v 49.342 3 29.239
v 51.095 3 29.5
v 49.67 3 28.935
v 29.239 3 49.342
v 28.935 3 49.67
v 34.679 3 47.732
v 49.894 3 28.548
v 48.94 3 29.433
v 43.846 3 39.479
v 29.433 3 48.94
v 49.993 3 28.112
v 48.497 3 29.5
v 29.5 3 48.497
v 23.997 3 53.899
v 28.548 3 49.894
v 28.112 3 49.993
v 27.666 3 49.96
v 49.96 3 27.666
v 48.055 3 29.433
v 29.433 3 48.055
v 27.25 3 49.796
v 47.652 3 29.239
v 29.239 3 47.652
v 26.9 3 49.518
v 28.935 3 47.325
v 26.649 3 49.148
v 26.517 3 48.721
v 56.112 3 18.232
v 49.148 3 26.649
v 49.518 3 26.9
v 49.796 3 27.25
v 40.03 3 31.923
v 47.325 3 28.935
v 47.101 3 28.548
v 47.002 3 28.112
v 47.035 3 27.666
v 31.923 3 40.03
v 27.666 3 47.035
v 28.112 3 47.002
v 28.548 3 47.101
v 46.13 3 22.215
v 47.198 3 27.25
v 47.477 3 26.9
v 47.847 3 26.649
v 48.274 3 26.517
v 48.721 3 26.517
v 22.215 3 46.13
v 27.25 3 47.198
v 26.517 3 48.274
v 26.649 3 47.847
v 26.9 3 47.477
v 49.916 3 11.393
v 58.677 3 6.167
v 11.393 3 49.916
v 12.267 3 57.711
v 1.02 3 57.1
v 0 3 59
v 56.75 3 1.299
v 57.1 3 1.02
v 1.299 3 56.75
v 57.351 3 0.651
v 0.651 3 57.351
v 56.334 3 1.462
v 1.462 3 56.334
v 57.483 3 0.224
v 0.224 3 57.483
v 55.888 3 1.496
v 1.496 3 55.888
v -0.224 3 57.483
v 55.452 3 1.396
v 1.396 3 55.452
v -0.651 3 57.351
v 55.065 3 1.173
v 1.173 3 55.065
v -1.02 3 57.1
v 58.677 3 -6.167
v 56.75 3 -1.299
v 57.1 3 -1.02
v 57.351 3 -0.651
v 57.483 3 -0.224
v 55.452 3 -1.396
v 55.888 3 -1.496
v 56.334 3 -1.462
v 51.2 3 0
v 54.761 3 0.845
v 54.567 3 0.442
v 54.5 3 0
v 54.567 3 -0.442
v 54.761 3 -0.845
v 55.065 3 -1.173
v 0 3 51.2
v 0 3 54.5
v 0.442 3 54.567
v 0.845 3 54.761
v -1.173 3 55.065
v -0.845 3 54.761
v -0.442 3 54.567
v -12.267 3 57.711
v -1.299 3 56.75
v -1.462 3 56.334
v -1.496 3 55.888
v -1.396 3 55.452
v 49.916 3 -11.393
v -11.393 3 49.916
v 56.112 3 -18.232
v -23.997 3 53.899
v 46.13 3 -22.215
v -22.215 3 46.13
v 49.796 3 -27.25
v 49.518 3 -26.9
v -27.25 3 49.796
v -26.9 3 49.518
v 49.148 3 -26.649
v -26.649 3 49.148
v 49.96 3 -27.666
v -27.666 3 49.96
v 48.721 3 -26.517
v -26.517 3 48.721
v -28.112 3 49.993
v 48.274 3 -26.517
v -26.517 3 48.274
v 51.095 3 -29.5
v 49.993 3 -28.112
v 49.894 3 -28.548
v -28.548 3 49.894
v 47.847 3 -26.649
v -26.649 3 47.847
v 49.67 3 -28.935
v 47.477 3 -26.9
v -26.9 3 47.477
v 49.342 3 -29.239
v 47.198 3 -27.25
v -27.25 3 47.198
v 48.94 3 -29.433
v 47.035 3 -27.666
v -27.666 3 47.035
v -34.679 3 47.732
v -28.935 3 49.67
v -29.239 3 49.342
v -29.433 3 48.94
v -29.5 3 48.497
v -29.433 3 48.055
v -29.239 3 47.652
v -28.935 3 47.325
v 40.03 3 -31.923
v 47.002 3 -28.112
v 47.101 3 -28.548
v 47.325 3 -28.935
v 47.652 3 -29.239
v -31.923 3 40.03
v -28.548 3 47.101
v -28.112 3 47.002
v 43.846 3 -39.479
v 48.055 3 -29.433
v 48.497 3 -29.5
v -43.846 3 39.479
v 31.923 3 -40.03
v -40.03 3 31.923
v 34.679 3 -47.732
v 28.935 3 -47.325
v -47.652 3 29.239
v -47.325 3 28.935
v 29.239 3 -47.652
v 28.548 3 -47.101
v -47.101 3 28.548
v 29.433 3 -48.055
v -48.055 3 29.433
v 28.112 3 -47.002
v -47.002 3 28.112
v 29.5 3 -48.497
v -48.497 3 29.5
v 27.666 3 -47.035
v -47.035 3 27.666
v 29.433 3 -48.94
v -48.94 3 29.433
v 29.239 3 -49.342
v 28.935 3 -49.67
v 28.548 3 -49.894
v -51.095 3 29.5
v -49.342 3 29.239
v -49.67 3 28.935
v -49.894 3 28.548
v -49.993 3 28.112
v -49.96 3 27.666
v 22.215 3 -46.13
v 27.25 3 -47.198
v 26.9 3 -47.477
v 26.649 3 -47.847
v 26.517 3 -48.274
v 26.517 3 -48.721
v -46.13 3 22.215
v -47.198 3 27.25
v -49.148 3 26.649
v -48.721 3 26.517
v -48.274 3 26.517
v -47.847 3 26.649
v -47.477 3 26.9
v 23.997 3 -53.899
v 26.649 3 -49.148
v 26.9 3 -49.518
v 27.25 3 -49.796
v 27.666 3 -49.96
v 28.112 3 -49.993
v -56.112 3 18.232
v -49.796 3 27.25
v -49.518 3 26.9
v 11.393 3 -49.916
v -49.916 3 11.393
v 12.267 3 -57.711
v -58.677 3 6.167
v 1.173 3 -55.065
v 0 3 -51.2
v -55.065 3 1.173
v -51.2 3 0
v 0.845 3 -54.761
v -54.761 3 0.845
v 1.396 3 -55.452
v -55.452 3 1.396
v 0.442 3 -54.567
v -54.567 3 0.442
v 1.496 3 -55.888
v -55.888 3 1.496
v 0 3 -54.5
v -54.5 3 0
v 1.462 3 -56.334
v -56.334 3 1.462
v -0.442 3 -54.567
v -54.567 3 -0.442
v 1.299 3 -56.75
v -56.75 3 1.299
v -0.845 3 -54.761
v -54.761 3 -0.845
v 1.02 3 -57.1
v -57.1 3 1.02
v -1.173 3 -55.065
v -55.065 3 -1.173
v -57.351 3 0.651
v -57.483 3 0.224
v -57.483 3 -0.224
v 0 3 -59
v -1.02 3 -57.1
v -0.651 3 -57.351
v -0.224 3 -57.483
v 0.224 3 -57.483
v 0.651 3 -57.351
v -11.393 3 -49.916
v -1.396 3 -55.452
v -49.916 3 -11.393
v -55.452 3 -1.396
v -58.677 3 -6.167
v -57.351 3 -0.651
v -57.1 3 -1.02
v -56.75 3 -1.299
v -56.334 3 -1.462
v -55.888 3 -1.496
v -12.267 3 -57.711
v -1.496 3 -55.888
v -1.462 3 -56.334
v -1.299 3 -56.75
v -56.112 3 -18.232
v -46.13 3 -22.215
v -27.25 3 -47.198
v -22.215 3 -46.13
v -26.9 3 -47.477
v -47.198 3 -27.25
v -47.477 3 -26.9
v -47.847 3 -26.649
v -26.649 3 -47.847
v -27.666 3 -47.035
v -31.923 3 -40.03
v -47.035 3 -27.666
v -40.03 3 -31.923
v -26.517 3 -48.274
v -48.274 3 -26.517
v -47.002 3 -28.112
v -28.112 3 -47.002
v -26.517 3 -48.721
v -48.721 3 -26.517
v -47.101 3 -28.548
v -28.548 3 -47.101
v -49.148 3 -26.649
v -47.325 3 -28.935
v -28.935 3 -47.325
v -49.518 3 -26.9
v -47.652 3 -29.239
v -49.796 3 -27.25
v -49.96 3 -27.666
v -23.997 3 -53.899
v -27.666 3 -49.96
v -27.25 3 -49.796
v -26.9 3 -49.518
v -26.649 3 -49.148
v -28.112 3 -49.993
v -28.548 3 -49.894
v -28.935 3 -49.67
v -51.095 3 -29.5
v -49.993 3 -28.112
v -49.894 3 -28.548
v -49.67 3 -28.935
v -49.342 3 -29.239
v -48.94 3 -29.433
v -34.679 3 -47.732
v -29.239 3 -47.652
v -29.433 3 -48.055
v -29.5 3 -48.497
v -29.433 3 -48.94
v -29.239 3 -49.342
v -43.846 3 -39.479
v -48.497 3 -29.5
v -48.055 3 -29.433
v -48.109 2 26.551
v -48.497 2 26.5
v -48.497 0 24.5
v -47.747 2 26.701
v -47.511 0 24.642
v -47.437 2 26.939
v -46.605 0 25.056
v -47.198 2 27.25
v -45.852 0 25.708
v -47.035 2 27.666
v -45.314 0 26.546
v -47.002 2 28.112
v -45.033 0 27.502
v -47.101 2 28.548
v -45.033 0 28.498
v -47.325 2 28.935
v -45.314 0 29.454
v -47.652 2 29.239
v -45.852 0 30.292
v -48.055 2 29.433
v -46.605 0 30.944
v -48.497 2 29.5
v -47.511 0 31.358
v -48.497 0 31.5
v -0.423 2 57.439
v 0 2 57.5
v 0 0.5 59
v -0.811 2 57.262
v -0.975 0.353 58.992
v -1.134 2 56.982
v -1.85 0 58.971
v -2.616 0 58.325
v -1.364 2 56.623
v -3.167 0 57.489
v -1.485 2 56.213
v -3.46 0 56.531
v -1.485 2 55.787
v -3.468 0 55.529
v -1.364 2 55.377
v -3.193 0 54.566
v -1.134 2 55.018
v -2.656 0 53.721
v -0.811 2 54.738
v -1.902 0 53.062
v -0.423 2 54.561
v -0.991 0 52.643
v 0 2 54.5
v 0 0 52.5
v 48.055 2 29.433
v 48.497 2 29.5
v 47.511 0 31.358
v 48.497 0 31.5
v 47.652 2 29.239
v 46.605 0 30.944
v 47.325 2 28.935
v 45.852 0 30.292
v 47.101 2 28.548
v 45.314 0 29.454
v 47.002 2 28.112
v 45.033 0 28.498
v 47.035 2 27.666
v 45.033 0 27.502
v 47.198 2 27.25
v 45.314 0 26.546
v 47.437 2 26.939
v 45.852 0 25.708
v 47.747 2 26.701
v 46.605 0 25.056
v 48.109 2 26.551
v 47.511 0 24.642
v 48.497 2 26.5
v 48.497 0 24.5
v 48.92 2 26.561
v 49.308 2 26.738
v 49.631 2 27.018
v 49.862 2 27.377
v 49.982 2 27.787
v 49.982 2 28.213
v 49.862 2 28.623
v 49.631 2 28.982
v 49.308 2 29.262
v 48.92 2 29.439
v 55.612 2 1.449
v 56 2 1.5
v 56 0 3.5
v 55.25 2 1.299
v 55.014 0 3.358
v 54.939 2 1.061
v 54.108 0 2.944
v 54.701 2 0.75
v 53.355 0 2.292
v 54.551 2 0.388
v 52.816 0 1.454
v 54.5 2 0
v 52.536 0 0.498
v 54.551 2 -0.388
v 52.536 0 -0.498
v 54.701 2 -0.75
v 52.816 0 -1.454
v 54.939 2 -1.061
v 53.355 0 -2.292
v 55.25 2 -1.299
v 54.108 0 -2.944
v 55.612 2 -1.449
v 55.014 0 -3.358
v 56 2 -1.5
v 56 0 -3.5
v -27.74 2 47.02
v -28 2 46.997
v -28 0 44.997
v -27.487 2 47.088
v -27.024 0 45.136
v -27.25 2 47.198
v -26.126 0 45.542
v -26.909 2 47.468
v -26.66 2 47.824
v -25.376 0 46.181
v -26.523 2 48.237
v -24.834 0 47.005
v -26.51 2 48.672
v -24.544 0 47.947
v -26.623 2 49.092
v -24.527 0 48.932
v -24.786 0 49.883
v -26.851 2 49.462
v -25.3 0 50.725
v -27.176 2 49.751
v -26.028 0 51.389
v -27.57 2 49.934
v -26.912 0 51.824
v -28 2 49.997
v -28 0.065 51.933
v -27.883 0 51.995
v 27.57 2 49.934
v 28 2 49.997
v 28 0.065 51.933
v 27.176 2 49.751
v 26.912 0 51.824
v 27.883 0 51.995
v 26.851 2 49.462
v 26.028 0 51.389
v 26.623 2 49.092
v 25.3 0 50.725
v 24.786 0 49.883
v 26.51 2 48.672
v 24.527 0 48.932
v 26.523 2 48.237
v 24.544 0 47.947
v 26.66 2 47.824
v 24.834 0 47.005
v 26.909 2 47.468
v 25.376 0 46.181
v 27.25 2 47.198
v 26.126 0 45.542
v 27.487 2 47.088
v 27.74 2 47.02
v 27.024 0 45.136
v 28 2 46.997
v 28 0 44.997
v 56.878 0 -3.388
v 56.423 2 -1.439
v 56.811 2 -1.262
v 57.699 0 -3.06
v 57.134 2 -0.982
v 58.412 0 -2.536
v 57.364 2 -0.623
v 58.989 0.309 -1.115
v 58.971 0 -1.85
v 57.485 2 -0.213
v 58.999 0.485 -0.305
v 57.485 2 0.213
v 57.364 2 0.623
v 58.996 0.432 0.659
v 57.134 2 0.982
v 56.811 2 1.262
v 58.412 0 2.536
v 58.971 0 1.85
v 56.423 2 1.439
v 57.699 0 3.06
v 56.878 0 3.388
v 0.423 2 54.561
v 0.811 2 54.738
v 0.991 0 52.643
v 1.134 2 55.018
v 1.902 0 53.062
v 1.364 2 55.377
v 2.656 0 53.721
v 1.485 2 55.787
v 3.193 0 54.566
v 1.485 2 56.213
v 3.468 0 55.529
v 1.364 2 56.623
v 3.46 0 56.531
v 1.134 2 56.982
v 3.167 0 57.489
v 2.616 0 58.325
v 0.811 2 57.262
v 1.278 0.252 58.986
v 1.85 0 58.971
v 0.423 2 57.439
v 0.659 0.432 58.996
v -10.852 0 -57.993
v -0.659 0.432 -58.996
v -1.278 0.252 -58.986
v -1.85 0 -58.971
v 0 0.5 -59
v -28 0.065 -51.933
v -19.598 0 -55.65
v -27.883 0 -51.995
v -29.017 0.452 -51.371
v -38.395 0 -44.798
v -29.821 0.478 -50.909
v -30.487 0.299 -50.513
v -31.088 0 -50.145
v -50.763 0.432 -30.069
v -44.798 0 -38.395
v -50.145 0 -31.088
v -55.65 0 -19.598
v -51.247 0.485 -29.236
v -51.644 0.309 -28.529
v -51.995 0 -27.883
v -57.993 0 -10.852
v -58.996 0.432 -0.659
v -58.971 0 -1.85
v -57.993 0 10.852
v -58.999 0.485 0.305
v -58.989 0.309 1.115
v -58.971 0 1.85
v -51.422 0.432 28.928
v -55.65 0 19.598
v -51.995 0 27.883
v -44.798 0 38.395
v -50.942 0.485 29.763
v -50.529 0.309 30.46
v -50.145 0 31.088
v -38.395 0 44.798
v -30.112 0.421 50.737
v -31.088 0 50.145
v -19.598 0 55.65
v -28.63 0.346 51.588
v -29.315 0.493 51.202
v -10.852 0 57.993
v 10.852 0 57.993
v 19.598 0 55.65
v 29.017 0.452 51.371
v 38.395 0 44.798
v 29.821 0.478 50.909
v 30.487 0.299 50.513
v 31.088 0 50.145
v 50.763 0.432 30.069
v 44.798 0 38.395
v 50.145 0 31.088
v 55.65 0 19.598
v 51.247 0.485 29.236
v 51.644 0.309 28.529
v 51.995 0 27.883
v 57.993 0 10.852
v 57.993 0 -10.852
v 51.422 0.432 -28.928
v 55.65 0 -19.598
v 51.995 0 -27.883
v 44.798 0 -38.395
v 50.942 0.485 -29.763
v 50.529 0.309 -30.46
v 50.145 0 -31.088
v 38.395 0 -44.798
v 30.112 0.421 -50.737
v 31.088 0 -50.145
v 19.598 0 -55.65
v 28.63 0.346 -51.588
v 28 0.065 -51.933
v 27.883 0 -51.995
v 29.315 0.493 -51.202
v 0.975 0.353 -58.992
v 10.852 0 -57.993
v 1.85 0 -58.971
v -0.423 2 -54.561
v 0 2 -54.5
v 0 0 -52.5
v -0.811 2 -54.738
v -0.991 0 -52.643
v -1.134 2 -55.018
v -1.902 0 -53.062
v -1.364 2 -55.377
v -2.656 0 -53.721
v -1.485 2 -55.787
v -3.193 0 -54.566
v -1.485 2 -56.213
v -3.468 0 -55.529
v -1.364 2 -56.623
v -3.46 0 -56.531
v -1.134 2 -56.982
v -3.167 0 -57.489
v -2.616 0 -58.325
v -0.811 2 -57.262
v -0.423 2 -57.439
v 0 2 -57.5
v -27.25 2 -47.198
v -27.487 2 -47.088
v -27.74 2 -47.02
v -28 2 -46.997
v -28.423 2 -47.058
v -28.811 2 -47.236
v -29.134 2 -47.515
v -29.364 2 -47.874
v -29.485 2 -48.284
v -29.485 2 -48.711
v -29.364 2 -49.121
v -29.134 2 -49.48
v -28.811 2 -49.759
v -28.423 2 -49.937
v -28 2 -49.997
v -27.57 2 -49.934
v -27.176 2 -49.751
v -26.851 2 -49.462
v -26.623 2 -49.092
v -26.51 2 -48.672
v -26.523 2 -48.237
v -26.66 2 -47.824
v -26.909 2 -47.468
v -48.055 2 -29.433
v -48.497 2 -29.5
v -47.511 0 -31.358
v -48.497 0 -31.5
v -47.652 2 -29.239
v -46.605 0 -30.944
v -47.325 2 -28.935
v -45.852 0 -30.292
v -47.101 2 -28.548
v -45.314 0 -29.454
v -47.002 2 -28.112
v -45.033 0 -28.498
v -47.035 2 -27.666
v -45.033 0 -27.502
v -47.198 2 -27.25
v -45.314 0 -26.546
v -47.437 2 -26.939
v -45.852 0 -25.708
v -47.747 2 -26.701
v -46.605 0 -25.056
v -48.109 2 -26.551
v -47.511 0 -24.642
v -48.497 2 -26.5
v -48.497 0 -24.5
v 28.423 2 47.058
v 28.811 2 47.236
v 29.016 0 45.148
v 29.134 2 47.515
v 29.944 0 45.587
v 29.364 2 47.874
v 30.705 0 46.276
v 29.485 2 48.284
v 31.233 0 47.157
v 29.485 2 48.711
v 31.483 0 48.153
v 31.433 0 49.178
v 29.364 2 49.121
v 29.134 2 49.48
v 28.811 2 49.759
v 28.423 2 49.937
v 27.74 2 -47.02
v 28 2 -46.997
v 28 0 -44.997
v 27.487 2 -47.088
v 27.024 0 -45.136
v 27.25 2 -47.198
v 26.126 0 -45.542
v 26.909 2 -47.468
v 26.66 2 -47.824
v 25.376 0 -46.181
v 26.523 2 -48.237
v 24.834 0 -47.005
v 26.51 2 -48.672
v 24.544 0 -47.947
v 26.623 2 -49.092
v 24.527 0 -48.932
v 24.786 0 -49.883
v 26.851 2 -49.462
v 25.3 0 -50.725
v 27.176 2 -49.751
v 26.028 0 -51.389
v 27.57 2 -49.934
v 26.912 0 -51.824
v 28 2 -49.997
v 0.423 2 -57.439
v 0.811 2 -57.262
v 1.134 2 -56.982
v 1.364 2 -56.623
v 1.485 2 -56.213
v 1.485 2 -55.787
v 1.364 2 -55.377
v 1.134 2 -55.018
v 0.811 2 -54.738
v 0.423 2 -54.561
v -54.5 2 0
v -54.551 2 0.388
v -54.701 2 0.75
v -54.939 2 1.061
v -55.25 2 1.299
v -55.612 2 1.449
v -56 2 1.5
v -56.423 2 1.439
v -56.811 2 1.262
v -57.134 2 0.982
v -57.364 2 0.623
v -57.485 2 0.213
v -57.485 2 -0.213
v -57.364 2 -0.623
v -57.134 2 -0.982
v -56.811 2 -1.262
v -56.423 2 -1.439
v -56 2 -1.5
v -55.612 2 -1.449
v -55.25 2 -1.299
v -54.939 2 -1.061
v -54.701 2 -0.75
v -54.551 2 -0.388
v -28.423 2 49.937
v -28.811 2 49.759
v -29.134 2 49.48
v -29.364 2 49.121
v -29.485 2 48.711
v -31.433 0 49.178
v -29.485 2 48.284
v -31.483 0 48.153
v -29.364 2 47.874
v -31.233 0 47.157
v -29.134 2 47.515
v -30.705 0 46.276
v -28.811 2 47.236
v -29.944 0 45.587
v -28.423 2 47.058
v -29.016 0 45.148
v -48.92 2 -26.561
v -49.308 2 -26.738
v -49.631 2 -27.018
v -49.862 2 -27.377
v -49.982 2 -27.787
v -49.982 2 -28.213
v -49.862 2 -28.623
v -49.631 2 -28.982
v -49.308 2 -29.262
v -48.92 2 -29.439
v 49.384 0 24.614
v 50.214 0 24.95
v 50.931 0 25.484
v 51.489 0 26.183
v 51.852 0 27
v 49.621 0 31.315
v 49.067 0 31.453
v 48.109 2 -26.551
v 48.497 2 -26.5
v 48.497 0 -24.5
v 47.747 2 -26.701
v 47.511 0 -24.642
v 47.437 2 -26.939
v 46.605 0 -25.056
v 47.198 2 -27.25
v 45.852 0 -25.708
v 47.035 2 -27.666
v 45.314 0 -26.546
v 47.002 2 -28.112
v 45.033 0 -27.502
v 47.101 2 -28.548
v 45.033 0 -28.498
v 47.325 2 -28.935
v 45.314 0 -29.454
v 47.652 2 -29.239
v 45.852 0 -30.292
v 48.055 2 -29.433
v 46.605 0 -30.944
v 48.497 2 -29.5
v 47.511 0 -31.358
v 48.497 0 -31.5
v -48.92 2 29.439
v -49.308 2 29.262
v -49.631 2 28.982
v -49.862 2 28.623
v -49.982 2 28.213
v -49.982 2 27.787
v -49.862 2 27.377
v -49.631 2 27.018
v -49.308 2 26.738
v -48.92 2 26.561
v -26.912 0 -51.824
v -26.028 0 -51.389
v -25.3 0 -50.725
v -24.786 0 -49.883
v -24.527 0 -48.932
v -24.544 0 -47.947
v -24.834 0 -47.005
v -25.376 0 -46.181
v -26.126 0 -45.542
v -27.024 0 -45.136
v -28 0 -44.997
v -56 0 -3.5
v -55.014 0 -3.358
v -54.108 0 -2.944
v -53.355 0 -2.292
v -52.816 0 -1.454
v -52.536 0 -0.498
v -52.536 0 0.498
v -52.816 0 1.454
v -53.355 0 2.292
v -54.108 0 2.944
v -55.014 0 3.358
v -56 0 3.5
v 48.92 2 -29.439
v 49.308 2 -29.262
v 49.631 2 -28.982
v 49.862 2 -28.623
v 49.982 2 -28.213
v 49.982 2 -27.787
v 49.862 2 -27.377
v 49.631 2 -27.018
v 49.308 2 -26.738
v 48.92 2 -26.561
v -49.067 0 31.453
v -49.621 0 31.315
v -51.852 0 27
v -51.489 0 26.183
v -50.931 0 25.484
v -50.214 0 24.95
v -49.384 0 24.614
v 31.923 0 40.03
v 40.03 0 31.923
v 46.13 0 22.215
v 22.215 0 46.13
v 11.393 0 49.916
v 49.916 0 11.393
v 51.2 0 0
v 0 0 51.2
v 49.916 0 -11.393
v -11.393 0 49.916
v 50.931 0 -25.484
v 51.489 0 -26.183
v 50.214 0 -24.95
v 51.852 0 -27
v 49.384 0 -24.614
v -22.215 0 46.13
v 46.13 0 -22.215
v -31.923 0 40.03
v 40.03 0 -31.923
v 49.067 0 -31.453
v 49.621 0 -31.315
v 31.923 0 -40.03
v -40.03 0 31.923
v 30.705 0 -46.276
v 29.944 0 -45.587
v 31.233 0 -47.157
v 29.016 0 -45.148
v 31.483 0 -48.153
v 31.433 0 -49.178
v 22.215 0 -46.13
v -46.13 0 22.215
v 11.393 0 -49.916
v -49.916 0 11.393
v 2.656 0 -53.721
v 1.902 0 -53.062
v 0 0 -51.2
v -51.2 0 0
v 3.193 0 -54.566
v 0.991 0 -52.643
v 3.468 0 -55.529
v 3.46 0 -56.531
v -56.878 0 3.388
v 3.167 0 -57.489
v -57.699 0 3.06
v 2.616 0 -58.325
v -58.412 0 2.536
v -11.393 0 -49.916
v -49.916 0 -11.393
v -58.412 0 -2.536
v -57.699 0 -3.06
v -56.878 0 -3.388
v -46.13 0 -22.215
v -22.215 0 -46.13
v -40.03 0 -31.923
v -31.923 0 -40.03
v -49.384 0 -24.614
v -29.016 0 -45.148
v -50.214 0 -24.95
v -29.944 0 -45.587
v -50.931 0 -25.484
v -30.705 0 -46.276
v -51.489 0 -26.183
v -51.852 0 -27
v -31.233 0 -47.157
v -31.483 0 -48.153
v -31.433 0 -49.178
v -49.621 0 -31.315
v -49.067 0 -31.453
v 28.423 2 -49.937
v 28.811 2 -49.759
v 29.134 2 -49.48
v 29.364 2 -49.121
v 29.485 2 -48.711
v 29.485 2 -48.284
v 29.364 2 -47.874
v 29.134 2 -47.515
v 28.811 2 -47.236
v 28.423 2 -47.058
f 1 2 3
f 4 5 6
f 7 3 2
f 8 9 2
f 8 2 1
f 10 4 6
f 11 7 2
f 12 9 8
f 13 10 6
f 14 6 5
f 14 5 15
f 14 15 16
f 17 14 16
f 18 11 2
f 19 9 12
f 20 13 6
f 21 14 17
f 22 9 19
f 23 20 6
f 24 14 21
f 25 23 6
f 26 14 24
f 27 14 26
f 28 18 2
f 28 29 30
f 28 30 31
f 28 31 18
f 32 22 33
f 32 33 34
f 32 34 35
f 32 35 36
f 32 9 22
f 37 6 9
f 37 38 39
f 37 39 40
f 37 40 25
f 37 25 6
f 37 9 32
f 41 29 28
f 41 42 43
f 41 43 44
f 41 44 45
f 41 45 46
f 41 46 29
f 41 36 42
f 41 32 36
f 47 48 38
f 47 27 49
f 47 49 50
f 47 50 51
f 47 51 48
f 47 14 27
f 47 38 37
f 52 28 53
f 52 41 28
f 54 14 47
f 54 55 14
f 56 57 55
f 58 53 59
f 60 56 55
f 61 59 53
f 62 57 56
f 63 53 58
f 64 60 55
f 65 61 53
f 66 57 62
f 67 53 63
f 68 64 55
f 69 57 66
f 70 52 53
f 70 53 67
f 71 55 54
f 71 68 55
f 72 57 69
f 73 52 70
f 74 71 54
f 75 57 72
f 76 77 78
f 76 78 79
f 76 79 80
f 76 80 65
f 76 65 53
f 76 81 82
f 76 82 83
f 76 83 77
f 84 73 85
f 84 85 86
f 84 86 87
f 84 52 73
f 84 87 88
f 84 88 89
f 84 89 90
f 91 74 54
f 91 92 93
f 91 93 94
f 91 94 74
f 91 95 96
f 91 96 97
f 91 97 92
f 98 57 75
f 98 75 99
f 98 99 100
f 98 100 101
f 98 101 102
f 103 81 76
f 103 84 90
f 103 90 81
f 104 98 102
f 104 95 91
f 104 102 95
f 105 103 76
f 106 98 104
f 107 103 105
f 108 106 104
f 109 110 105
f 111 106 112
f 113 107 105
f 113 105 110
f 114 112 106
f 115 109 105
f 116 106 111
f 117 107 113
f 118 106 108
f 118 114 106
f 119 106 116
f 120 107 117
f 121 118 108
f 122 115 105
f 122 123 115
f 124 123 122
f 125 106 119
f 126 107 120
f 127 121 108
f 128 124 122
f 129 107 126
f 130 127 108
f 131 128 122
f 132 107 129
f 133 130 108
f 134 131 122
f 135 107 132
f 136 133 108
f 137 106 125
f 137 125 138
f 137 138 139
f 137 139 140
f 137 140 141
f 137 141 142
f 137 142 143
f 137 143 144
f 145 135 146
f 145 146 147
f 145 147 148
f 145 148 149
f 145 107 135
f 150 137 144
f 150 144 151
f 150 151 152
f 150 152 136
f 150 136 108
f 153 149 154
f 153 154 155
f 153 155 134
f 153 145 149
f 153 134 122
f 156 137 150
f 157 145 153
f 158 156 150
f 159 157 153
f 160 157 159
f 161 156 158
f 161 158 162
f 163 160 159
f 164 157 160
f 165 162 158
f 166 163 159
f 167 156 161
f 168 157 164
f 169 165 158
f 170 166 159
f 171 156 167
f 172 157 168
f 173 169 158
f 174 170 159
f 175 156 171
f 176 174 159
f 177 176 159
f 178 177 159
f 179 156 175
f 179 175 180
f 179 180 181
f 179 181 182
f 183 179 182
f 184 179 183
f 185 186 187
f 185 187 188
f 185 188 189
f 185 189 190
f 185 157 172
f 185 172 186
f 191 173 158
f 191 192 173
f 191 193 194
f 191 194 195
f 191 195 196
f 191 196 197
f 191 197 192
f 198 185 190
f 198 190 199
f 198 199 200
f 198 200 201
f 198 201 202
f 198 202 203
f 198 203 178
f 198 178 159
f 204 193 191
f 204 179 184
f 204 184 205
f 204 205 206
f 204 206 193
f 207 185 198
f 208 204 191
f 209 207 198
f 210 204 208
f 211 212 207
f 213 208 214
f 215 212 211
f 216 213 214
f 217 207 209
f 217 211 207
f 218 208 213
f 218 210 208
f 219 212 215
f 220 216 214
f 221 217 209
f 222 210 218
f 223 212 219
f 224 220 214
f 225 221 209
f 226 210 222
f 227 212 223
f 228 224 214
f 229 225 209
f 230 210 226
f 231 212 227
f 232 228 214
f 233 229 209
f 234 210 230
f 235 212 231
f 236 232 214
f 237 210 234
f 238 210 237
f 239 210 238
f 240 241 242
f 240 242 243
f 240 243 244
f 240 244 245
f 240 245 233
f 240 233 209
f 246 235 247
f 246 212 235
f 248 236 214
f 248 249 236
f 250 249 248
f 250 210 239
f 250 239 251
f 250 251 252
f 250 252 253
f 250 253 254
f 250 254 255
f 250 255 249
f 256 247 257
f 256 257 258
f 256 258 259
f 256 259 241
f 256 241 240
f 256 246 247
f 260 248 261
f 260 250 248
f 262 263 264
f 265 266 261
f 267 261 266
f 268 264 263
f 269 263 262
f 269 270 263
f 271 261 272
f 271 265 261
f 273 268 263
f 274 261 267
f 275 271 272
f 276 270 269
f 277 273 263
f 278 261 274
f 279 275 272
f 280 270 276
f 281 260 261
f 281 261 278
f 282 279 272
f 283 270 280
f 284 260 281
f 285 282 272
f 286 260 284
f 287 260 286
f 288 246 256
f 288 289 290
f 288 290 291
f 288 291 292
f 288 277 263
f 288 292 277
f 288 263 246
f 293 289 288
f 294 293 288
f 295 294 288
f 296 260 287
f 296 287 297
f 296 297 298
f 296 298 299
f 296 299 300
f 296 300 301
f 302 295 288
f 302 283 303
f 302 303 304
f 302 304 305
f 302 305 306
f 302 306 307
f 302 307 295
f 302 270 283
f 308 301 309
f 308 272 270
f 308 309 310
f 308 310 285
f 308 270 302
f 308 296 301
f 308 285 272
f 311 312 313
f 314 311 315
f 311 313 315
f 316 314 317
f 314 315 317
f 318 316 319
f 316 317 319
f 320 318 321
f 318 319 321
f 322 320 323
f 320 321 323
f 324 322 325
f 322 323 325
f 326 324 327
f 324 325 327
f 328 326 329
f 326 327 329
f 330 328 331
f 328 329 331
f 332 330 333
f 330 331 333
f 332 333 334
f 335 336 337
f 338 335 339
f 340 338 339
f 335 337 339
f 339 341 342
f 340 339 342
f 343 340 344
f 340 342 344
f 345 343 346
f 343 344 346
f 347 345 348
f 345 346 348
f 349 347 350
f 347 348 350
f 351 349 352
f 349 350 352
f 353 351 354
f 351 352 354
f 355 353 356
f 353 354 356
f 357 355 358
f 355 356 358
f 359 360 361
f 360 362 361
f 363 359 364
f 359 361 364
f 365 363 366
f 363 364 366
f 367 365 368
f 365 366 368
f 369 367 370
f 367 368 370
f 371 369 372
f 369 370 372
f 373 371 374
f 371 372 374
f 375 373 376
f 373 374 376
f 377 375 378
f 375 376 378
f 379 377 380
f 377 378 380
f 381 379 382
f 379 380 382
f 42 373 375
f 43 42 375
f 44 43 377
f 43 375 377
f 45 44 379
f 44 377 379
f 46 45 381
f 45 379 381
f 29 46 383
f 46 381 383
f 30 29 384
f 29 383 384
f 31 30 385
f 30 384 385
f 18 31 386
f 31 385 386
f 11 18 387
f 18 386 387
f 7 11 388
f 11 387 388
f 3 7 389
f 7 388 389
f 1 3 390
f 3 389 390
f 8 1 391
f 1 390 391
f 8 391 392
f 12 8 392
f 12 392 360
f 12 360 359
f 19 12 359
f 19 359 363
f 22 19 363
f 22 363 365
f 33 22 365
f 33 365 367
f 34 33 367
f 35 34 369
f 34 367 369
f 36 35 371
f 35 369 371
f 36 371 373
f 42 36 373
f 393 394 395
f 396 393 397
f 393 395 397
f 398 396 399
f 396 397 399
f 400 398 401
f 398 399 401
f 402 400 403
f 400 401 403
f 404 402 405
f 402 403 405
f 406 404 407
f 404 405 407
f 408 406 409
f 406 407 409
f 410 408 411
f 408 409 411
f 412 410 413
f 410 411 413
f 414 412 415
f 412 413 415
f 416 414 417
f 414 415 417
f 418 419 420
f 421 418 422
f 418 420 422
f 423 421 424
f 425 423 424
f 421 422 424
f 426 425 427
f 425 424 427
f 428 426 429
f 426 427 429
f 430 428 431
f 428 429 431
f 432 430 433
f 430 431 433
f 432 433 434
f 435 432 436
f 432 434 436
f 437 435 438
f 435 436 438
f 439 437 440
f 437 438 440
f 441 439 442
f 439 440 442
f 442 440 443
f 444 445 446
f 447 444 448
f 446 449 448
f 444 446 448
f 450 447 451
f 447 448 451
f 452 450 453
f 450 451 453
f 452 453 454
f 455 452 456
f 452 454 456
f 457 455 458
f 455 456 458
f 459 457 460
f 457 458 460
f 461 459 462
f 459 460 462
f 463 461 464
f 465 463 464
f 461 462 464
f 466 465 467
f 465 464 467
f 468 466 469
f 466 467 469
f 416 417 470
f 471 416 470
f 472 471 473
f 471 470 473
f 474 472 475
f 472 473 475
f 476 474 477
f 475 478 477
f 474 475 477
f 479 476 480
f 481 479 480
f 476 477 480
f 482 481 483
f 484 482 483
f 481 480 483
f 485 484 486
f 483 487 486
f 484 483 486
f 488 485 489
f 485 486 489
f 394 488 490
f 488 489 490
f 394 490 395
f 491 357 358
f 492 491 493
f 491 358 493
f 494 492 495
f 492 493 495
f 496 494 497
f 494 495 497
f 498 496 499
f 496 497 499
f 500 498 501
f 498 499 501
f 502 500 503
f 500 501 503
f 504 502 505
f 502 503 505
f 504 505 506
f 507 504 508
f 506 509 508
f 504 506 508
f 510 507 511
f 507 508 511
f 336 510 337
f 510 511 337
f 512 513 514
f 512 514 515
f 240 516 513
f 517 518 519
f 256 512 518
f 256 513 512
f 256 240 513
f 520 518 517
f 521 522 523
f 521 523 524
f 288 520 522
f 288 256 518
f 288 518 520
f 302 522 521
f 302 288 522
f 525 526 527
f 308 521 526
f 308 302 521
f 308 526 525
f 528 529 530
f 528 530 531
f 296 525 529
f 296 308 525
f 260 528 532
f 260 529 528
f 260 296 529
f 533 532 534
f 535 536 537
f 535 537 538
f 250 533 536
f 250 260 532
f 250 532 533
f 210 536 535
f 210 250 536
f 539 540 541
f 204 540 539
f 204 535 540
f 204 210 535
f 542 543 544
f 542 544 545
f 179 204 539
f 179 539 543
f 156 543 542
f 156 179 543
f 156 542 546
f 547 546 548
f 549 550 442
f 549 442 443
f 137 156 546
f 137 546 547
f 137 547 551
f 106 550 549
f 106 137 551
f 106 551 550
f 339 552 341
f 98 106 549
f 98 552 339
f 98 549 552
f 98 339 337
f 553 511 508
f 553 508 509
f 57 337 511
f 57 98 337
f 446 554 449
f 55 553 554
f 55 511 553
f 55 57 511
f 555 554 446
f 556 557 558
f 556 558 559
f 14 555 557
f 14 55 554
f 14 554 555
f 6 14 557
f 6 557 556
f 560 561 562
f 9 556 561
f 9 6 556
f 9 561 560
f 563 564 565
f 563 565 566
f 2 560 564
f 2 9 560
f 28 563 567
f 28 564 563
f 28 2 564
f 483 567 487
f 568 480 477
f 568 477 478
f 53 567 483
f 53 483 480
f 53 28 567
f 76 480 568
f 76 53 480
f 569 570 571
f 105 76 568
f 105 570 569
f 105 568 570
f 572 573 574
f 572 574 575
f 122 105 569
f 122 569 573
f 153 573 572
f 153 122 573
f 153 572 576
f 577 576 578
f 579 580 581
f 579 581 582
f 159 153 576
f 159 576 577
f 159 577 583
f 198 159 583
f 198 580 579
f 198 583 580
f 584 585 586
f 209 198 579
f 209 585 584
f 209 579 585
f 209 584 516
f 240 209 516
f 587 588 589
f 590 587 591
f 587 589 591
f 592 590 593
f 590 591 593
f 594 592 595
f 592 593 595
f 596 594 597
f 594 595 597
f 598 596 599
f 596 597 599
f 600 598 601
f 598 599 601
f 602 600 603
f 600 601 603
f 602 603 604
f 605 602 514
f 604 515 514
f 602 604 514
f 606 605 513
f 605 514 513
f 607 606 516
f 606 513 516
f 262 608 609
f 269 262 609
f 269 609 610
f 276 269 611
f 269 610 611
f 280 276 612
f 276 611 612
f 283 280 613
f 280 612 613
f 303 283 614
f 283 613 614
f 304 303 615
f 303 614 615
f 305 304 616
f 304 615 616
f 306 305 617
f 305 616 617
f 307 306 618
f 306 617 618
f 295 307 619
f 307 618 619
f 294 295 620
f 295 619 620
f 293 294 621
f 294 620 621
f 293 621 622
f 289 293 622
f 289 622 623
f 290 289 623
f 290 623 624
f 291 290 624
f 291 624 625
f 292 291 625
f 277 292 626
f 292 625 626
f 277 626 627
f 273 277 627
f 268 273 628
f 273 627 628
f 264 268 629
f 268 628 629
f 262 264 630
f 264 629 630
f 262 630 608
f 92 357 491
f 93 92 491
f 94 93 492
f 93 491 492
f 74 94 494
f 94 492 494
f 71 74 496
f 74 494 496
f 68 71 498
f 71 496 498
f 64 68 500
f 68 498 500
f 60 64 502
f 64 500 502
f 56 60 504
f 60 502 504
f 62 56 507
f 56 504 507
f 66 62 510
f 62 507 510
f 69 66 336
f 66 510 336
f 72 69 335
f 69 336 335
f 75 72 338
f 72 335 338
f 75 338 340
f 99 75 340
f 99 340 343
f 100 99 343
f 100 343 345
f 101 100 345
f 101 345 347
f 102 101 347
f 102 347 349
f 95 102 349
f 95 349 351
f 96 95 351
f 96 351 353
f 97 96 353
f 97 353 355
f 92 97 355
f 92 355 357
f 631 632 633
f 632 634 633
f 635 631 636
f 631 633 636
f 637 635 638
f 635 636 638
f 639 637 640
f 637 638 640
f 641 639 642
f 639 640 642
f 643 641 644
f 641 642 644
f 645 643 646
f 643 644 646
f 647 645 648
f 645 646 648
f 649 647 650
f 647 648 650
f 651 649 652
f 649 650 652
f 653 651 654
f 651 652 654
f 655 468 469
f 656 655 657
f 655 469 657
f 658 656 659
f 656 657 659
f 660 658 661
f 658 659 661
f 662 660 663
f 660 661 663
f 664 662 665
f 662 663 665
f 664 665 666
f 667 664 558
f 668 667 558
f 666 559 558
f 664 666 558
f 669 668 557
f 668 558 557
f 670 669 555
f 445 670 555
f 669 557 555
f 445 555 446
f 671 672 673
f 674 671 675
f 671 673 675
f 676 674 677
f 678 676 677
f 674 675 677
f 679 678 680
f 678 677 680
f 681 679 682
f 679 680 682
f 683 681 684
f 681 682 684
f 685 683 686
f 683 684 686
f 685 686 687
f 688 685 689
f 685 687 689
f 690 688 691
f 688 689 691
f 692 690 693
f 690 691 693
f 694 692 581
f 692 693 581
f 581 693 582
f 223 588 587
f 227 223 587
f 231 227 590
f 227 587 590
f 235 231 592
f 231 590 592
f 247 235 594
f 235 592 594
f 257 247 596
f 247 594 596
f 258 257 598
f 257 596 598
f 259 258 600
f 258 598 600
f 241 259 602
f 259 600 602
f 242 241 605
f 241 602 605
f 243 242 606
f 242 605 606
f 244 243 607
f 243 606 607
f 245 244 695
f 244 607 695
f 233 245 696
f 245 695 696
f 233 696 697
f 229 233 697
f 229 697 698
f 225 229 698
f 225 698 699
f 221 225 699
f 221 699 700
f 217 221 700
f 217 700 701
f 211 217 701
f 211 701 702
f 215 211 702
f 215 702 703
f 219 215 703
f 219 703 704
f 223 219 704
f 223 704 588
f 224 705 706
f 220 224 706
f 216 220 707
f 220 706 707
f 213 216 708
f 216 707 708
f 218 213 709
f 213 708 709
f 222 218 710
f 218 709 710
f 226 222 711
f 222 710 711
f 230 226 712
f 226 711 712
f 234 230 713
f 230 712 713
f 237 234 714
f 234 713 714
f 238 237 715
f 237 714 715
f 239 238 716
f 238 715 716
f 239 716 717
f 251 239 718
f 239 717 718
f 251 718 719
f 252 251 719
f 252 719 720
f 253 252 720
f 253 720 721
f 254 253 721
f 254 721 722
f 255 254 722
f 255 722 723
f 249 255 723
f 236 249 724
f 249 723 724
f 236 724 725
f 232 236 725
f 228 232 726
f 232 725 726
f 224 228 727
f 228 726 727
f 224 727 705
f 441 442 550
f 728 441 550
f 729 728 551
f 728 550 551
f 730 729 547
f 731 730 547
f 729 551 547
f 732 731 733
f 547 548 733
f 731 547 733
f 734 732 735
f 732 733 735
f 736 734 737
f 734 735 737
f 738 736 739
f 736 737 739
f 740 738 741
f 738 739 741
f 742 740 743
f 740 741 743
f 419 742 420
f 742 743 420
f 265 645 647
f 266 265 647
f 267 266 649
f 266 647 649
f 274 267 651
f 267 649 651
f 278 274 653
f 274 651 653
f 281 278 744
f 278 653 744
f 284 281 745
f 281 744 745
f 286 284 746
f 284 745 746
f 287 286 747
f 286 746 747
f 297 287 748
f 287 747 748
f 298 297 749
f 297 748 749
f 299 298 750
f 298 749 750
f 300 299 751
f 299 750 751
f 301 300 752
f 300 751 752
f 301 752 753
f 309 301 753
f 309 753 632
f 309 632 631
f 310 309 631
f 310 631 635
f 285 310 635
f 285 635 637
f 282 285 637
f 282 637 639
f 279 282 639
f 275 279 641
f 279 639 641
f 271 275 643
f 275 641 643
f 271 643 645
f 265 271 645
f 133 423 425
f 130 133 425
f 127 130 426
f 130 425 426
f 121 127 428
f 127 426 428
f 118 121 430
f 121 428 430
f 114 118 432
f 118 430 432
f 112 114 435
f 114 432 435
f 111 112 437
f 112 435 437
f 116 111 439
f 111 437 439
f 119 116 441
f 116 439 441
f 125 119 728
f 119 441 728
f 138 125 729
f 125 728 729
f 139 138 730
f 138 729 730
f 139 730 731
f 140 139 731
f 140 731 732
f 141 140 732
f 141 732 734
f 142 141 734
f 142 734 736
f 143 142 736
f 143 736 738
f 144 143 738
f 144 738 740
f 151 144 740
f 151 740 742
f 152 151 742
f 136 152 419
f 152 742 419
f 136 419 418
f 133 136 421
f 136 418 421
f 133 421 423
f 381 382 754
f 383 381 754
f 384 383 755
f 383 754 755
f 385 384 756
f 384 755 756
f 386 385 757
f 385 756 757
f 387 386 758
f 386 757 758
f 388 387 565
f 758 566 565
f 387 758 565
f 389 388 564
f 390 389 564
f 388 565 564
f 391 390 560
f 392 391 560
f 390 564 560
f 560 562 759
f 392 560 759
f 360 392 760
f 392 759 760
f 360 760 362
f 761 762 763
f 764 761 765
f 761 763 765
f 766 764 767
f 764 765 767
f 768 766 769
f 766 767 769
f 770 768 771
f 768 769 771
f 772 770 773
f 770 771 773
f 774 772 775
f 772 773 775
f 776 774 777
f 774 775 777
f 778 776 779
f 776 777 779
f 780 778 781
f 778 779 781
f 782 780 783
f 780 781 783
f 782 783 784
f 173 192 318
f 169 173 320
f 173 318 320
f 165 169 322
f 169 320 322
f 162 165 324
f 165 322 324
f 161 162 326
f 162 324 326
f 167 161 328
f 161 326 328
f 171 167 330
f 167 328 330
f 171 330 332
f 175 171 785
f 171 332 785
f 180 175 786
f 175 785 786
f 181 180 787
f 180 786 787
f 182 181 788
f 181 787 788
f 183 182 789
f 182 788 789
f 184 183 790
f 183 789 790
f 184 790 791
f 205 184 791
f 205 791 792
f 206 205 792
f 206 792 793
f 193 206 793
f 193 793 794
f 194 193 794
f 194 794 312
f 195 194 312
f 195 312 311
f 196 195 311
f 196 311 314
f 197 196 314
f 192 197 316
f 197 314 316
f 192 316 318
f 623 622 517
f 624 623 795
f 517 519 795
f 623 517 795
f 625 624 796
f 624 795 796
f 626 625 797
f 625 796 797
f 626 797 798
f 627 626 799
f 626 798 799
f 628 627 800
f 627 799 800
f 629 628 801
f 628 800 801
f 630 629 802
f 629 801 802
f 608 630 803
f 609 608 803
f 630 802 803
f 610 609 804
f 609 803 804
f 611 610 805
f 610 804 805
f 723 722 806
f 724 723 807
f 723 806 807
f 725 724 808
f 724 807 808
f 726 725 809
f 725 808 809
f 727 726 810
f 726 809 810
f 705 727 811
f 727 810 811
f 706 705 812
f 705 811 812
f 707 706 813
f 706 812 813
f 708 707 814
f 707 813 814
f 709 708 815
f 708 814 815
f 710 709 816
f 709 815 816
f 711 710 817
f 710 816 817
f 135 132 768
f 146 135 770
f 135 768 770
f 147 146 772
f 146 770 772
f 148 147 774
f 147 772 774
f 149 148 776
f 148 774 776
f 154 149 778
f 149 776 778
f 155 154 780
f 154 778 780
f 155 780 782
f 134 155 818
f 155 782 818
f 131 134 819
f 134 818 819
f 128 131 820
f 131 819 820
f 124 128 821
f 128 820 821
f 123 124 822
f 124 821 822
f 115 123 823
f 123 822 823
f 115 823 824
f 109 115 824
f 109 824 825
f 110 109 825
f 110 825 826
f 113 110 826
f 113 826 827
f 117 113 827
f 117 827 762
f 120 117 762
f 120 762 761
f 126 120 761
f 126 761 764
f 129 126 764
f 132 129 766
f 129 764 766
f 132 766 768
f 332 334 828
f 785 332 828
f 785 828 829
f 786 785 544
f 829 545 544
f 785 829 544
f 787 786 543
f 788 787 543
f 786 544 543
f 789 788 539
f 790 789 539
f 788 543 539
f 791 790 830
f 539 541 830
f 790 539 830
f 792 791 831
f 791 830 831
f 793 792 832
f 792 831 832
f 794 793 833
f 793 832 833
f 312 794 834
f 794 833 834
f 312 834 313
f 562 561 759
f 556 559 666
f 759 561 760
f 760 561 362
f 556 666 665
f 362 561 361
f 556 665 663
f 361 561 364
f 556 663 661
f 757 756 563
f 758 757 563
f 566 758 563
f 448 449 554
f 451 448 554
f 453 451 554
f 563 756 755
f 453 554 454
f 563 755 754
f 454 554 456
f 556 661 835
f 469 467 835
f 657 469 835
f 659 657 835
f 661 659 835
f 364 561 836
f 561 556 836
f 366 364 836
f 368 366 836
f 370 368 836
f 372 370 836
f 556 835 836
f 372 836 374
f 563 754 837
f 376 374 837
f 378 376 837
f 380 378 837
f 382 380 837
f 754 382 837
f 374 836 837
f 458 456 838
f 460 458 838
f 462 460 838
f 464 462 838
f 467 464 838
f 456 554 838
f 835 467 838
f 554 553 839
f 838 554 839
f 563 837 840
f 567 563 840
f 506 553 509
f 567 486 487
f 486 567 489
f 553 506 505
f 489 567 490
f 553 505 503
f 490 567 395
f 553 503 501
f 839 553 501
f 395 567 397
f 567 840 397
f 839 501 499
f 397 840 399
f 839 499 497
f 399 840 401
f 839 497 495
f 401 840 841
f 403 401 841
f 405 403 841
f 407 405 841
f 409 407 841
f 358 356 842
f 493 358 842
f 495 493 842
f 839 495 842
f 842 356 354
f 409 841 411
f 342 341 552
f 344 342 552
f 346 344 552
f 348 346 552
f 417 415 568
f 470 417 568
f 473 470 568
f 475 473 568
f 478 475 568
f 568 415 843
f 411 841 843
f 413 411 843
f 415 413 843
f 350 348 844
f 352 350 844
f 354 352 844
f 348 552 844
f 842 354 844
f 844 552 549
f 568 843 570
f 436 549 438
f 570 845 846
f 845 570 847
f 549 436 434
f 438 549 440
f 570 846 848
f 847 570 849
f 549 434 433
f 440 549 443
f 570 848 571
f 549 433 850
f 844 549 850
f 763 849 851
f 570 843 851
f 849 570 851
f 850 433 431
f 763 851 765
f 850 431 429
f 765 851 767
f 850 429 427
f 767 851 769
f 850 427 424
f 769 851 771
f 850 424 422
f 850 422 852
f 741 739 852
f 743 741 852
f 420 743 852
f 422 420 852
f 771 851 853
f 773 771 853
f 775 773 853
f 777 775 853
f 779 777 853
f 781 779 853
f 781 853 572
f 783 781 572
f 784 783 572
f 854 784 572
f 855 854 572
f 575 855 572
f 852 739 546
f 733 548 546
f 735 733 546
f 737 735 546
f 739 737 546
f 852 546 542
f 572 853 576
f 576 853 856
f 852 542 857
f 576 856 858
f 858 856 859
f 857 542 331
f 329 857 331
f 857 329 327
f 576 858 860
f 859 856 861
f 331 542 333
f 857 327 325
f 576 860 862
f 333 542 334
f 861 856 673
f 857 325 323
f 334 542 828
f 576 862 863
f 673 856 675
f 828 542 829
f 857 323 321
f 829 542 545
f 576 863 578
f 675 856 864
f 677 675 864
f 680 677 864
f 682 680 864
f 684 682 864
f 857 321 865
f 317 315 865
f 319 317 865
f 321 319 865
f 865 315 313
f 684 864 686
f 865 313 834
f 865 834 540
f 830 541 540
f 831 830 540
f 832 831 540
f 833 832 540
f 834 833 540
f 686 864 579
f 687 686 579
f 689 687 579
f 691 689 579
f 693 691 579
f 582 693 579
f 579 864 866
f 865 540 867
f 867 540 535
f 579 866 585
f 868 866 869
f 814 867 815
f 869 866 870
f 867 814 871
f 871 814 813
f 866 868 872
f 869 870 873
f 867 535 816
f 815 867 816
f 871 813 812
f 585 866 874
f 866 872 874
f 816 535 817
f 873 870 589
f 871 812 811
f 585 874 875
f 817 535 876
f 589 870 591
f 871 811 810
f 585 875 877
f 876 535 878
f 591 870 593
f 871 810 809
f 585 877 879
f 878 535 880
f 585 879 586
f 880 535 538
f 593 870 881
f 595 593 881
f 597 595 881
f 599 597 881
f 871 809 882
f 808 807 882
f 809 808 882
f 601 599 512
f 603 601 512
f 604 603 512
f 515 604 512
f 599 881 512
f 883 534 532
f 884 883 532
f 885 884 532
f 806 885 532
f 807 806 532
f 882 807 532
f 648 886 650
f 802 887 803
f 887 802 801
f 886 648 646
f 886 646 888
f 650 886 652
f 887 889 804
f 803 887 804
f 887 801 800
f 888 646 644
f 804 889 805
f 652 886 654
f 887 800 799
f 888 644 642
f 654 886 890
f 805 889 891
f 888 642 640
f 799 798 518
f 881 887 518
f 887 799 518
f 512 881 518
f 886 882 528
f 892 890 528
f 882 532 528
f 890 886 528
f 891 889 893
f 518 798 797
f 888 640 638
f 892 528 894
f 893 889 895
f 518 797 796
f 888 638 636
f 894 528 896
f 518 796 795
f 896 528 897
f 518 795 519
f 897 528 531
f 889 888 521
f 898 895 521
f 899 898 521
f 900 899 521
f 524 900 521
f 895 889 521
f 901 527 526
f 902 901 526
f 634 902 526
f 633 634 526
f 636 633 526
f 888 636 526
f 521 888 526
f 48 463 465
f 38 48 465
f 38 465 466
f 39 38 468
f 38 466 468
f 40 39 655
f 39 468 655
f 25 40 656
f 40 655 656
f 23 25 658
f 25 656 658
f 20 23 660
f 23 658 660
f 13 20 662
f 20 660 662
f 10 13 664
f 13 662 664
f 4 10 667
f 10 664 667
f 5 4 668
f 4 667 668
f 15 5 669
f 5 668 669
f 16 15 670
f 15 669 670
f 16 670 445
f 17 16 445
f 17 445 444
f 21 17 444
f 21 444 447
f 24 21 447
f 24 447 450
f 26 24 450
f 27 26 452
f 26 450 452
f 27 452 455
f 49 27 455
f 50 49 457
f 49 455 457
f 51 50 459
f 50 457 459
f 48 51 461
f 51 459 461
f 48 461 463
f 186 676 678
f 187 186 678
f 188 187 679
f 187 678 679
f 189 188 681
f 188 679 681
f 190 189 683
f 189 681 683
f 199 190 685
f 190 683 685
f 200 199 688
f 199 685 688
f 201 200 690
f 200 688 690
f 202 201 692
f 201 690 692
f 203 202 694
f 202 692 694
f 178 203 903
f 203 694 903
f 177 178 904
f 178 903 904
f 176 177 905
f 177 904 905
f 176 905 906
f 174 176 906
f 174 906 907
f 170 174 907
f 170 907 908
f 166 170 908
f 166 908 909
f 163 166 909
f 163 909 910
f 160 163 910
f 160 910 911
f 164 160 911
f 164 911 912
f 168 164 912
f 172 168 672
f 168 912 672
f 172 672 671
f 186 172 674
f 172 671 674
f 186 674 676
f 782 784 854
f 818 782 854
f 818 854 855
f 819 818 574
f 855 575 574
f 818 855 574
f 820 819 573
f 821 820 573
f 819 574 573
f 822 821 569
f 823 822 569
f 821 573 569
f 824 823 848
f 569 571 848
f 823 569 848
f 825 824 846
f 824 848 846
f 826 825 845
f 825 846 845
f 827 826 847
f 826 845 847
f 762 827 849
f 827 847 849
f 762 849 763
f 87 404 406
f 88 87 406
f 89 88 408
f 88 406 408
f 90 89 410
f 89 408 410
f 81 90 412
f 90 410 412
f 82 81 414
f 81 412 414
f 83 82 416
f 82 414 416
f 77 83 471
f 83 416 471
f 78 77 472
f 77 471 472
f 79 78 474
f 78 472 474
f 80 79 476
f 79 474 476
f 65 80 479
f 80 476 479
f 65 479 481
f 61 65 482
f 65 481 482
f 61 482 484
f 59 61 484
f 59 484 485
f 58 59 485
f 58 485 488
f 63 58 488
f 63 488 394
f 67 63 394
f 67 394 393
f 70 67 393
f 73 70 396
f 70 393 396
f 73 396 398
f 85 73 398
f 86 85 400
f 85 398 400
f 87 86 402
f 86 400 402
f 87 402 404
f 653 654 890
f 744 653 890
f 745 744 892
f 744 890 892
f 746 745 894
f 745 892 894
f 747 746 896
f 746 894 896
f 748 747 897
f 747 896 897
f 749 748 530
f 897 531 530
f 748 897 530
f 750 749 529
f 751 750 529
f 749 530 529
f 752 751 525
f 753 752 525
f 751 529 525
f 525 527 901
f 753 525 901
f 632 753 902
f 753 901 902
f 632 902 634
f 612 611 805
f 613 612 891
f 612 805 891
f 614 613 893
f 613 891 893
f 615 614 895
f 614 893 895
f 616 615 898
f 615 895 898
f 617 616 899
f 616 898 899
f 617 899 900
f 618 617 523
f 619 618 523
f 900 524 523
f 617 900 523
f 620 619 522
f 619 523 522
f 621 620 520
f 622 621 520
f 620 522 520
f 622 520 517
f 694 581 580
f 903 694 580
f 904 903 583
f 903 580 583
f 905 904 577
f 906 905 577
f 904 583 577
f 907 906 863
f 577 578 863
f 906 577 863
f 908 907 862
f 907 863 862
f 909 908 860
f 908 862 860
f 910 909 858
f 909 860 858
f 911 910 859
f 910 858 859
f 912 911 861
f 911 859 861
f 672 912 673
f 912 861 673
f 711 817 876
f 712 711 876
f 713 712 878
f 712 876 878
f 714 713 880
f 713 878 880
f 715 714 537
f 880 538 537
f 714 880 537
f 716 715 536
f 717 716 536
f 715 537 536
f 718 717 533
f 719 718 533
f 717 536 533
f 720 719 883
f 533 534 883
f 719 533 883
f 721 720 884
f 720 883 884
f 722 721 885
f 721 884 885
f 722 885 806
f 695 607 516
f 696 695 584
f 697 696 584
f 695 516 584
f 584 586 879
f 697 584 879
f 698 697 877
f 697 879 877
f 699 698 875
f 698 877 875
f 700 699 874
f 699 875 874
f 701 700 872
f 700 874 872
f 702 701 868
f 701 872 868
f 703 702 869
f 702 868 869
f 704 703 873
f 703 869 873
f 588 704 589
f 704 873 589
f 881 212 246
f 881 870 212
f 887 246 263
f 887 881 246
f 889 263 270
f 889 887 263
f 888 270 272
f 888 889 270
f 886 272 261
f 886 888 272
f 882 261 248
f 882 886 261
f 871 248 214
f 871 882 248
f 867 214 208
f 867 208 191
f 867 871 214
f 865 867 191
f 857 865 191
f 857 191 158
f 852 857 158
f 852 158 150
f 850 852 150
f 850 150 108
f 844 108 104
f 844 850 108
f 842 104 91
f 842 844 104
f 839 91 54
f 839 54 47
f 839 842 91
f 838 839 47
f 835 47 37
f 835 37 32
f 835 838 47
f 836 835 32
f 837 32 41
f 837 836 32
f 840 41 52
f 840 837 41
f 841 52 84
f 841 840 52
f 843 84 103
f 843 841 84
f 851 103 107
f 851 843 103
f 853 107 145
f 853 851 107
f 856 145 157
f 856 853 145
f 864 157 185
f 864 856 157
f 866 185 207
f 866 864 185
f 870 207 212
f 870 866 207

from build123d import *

# Parameters (mm, degrees)
SKETCH_2_R               = 1.5
CUT_EXTRUDE_1_DEPTH      = 10
PATTERN_CIRCULAR_1_COUNT = 12


with BuildPart() as part:
    # 草图1 → 旋转1 (revolve)
    with BuildSketch(Plane.XY, mode=Mode.PRIVATE) as revolve_1_sk:
        Polygon((-53, 0), (-59, 0), (-59, 3), (-51.2, 3), (-51.2, 0), align=None)
    revolve(revolve_1_sk.sketch.rotate(Axis((0, 0, 0), (0, 1, 0)), 270), axis=Axis((0, 0, 0), (0, 1, 0)))

    # 草图2 → 切除-拉伸1 (cut)
    with BuildSketch(Plane.XZ):
        with Locations(Location((0, 56, 0), (0, 0, 270))):
            Circle(SKETCH_2_R)
    cut_extrude_1 = extrude(amount=-CUT_EXTRUDE_1_DEPTH, mode=Mode.SUBTRACT)

    # 阵列(圆周)1: 切除-拉伸1 ×12 about axis
    pattern_circular_1_axis = Axis((0, 0, 0), (0, 1, 0))
    for i in range(1, PATTERN_CIRCULAR_1_COUNT):
        add(cut_extrude_1.rotate(pattern_circular_1_axis, i * 360 / PATTERN_CIRCULAR_1_COUNT), mode=Mode.SUBTRACT)

    # 圆角1: read off the stored shape, not the designer's step
    # 圆角1: loft between two sections, ruled curve by curve
    fillet_1_from = [
        Edge.make_three_point_arc((28, 2, 46.997422612), (29.5, 2, 48.497422612), (28, 2, 49.997422612)),
        Edge.make_three_point_arc((28, 2, 49.997422612), (26.5, 2, 48.497422612), (28, 2, 46.997422612)),
    ]
    fillet_1_to = [
        Edge.make_three_point_arc((28, 0, 44.997422612), (31.5, 0, 48.497422612), (28, 0, 51.997422612)),
        Edge.make_three_point_arc((28, 0, 51.997422612), (24.5, 0, 48.497422612), (28, 0, 44.997422612)),
    ]
    fillet_1 = Solid(Shell([*[Face.make_surface_from_curves(fillet_1_from[k], fillet_1_to[k]) for k in range(2)], Face(Wire(fillet_1_from)), Face(Wire(fillet_1_to))]))
    add(fillet_1, mode=Mode.SUBTRACT)

    # Fillet 1 2: loft between two sections, ruled curve by curve
    fillet_1_2_from = [
        Edge.make_three_point_arc((48.497422612, 2, 26.5), (49.997422612, 2, 28), (48.497422612, 2, 29.5)),
        Edge.make_three_point_arc((48.497422612, 2, 29.5), (46.997422612, 2, 28), (48.497422612, 2, 26.5)),
    ]
    fillet_1_2_to = [
        Edge.make_three_point_arc((48.497422612, 0, 24.5), (51.997422612, 0, 28), (48.497422612, 0, 31.5)),
        Edge.make_three_point_arc((48.497422612, 0, 31.5), (44.997422612, 0, 28), (48.497422612, 0, 24.5)),
    ]
    fillet_1_2 = Solid(Shell([*[Face.make_surface_from_curves(fillet_1_2_from[k], fillet_1_2_to[k]) for k in range(2)], Face(Wire(fillet_1_2_from)), Face(Wire(fillet_1_2_to))]))
    add(fillet_1_2, mode=Mode.SUBTRACT)

    # Fillet 1 3: loft between two sections, ruled curve by curve
    fillet_1_3_from = [
        Edge.make_three_point_arc((56, 2, -1.5), (57.5, 2, 0), (56, 2, 1.5)),
        Edge.make_three_point_arc((56, 2, 1.5), (54.5, 2, 0), (56, 2, -1.5)),
    ]
    fillet_1_3_to = [
        Edge.make_three_point_arc((56, 0, -3.5), (59.5, 0, 0), (56, 0, 3.5)),
        Edge.make_three_point_arc((56, 0, 3.5), (52.5, 0, 0), (56, 0, -3.5)),
    ]
    fillet_1_3 = Solid(Shell([*[Face.make_surface_from_curves(fillet_1_3_from[k], fillet_1_3_to[k]) for k in range(2)], Face(Wire(fillet_1_3_from)), Face(Wire(fillet_1_3_to))]))
    add(fillet_1_3, mode=Mode.SUBTRACT)

    # Fillet 1 4: loft between two sections, ruled curve by curve
    fillet_1_4_from = [
        Edge.make_three_point_arc((48.497422612, 2, -29.5), (49.997422612, 2, -28), (48.497422612, 2, -26.5)),
        Edge.make_three_point_arc((48.497422612, 2, -26.5), (46.997422612, 2, -28), (48.497422612, 2, -29.5)),
    ]
    fillet_1_4_to = [
        Edge.make_three_point_arc((48.497422612, 0, -31.5), (51.997422612, 0, -28), (48.497422612, 0, -24.5)),
        Edge.make_three_point_arc((48.497422612, 0, -24.5), (44.997422612, 0, -28), (48.497422612, 0, -31.5)),
    ]
    fillet_1_4 = Solid(Shell([*[Face.make_surface_from_curves(fillet_1_4_from[k], fillet_1_4_to[k]) for k in range(2)], Face(Wire(fillet_1_4_from)), Face(Wire(fillet_1_4_to))]))
    add(fillet_1_4, mode=Mode.SUBTRACT)

    # Fillet 1 5: loft between two sections, ruled curve by curve
    fillet_1_5_from = [
        Edge.make_three_point_arc((28, 2, -49.997422612), (29.5, 2, -48.497422612), (28, 2, -46.997422612)),
        Edge.make_three_point_arc((28, 2, -46.997422612), (26.5, 2, -48.497422612), (28, 2, -49.997422612)),
    ]
    fillet_1_5_to = [
        Edge.make_three_point_arc((28, 0, -51.997422612), (31.5, 0, -48.497422612), (28, 0, -44.997422612)),
        Edge.make_three_point_arc((28, 0, -44.997422612), (24.5, 0, -48.497422612), (28, 0, -51.997422612)),
    ]
    fillet_1_5 = Solid(Shell([*[Face.make_surface_from_curves(fillet_1_5_from[k], fillet_1_5_to[k]) for k in range(2)], Face(Wire(fillet_1_5_from)), Face(Wire(fillet_1_5_to))]))
    add(fillet_1_5, mode=Mode.SUBTRACT)

    # Fillet 1 6: loft between two sections, ruled curve by curve
    fillet_1_6_from = [
        Edge.make_three_point_arc((0, 2, -57.5), (1.5, 2, -56), (0, 2, -54.5)),
        Edge.make_three_point_arc((0, 2, -54.5), (-1.5, 2, -56), (0, 2, -57.5)),
    ]
    fillet_1_6_to = [
        Edge.make_three_point_arc((0, 0, -59.5), (3.5, 0, -56), (0, 0, -52.5)),
        Edge.make_three_point_arc((0, 0, -52.5), (-3.5, 0, -56), (0, 0, -59.5)),
    ]
    fillet_1_6 = Solid(Shell([*[Face.make_surface_from_curves(fillet_1_6_from[k], fillet_1_6_to[k]) for k in range(2)], Face(Wire(fillet_1_6_from)), Face(Wire(fillet_1_6_to))]))
    add(fillet_1_6, mode=Mode.SUBTRACT)

    # Fillet 1 7: loft between two sections, ruled curve by curve
    fillet_1_7_from = [
        Edge.make_three_point_arc((-28, 2, -49.997422612), (-26.5, 2, -48.497422612), (-28, 2, -46.997422612)),
        Edge.make_three_point_arc((-28, 2, -46.997422612), (-29.5, 2, -48.497422612), (-28, 2, -49.997422612)),
    ]
    fillet_1_7_to = [
        Edge.make_three_point_arc((-28, 0, -51.997422612), (-24.5, 0, -48.497422612), (-28, 0, -44.997422612)),
        Edge.make_three_point_arc((-28, 0, -44.997422612), (-31.5, 0, -48.497422612), (-28, 0, -51.997422612)),
    ]
    fillet_1_7 = Solid(Shell([*[Face.make_surface_from_curves(fillet_1_7_from[k], fillet_1_7_to[k]) for k in range(2)], Face(Wire(fillet_1_7_from)), Face(Wire(fillet_1_7_to))]))
    add(fillet_1_7, mode=Mode.SUBTRACT)

    # Fillet 1 8: loft between two sections, ruled curve by curve
    fillet_1_8_from = [
        Edge.make_three_point_arc((-48.497422612, 2, -29.5), (-46.997422612, 2, -28), (-48.497422612, 2, -26.5)),
        Edge.make_three_point_arc((-48.497422612, 2, -26.5), (-49.997422612, 2, -28), (-48.497422612, 2, -29.5)),
    ]
    fillet_1_8_to = [
        Edge.make_three_point_arc((-48.497422612, 0, -31.5), (-44.997422612, 0, -28), (-48.497422612, 0, -24.5)),
        Edge.make_three_point_arc((-48.497422612, 0, -24.5), (-51.997422612, 0, -28), (-48.497422612, 0, -31.5)),
    ]
    fillet_1_8 = Solid(Shell([*[Face.make_surface_from_curves(fillet_1_8_from[k], fillet_1_8_to[k]) for k in range(2)], Face(Wire(fillet_1_8_from)), Face(Wire(fillet_1_8_to))]))
    add(fillet_1_8, mode=Mode.SUBTRACT)

    # Fillet 1 9: loft between two sections, ruled curve by curve
    fillet_1_9_from = [
        Edge.make_three_point_arc((-56, 2, -1.5), (-54.5, 2, 0), (-56, 2, 1.5)),
        Edge.make_three_point_arc((-56, 2, 1.5), (-57.5, 2, 0), (-56, 2, -1.5)),
    ]
    fillet_1_9_to = [
        Edge.make_three_point_arc((-56, 0, -3.5), (-52.5, 0, 0), (-56, 0, 3.5)),
        Edge.make_three_point_arc((-56, 0, 3.5), (-59.5, 0, 0), (-56, 0, -3.5)),
    ]
    fillet_1_9 = Solid(Shell([*[Face.make_surface_from_curves(fillet_1_9_from[k], fillet_1_9_to[k]) for k in range(2)], Face(Wire(fillet_1_9_from)), Face(Wire(fillet_1_9_to))]))
    add(fillet_1_9, mode=Mode.SUBTRACT)

    # Fillet 1 10: loft between two sections, ruled curve by curve
    fillet_1_10_from = [
        Edge.make_three_point_arc((-48.497422612, 2, 26.5), (-46.997422612, 2, 28), (-48.497422612, 2, 29.5)),
        Edge.make_three_point_arc((-48.497422612, 2, 29.5), (-49.997422612, 2, 28), (-48.497422612, 2, 26.5)),
    ]
    fillet_1_10_to = [
        Edge.make_three_point_arc((-48.497422612, 0, 24.5), (-44.997422612, 0, 28), (-48.497422612, 0, 31.5)),
        Edge.make_three_point_arc((-48.497422612, 0, 31.5), (-51.997422612, 0, 28), (-48.497422612, 0, 24.5)),
    ]
    fillet_1_10 = Solid(Shell([*[Face.make_surface_from_curves(fillet_1_10_from[k], fillet_1_10_to[k]) for k in range(2)], Face(Wire(fillet_1_10_from)), Face(Wire(fillet_1_10_to))]))
    add(fillet_1_10, mode=Mode.SUBTRACT)

    # Fillet 1 11: loft between two sections, ruled curve by curve
    fillet_1_11_from = [
        Edge.make_three_point_arc((-28, 2, 46.997422612), (-26.5, 2, 48.497422612), (-28, 2, 49.997422612)),
        Edge.make_three_point_arc((-28, 2, 49.997422612), (-29.5, 2, 48.497422612), (-28, 2, 46.997422612)),
    ]
    fillet_1_11_to = [
        Edge.make_three_point_arc((-28, 0, 44.997422612), (-24.5, 0, 48.497422612), (-28, 0, 51.997422612)),
        Edge.make_three_point_arc((-28, 0, 51.997422612), (-31.5, 0, 48.497422612), (-28, 0, 44.997422612)),
    ]
    fillet_1_11 = Solid(Shell([*[Face.make_surface_from_curves(fillet_1_11_from[k], fillet_1_11_to[k]) for k in range(2)], Face(Wire(fillet_1_11_from)), Face(Wire(fillet_1_11_to))]))
    add(fillet_1_11, mode=Mode.SUBTRACT)

    # Fillet 1 12: loft between two sections, ruled curve by curve
    fillet_1_12_from = [
        Edge.make_three_point_arc((0, 2, 54.5), (1.5, 2, 56), (0, 2, 57.5)),
        Edge.make_three_point_arc((0, 2, 57.5), (-1.5, 2, 56), (0, 2, 54.5)),
    ]
    fillet_1_12_to = [
        Edge.make_three_point_arc((0, 0, 52.5), (3.5, 0, 56), (0, 0, 59.5)),
        Edge.make_three_point_arc((0, 0, 59.5), (-3.5, 0, 56), (0, 0, 52.5)),
    ]
    fillet_1_12 = Solid(Shell([*[Face.make_surface_from_curves(fillet_1_12_from[k], fillet_1_12_to[k]) for k in range(2)], Face(Wire(fillet_1_12_from)), Face(Wire(fillet_1_12_to))]))
    add(fillet_1_12, mode=Mode.SUBTRACT)


solid = part.part
